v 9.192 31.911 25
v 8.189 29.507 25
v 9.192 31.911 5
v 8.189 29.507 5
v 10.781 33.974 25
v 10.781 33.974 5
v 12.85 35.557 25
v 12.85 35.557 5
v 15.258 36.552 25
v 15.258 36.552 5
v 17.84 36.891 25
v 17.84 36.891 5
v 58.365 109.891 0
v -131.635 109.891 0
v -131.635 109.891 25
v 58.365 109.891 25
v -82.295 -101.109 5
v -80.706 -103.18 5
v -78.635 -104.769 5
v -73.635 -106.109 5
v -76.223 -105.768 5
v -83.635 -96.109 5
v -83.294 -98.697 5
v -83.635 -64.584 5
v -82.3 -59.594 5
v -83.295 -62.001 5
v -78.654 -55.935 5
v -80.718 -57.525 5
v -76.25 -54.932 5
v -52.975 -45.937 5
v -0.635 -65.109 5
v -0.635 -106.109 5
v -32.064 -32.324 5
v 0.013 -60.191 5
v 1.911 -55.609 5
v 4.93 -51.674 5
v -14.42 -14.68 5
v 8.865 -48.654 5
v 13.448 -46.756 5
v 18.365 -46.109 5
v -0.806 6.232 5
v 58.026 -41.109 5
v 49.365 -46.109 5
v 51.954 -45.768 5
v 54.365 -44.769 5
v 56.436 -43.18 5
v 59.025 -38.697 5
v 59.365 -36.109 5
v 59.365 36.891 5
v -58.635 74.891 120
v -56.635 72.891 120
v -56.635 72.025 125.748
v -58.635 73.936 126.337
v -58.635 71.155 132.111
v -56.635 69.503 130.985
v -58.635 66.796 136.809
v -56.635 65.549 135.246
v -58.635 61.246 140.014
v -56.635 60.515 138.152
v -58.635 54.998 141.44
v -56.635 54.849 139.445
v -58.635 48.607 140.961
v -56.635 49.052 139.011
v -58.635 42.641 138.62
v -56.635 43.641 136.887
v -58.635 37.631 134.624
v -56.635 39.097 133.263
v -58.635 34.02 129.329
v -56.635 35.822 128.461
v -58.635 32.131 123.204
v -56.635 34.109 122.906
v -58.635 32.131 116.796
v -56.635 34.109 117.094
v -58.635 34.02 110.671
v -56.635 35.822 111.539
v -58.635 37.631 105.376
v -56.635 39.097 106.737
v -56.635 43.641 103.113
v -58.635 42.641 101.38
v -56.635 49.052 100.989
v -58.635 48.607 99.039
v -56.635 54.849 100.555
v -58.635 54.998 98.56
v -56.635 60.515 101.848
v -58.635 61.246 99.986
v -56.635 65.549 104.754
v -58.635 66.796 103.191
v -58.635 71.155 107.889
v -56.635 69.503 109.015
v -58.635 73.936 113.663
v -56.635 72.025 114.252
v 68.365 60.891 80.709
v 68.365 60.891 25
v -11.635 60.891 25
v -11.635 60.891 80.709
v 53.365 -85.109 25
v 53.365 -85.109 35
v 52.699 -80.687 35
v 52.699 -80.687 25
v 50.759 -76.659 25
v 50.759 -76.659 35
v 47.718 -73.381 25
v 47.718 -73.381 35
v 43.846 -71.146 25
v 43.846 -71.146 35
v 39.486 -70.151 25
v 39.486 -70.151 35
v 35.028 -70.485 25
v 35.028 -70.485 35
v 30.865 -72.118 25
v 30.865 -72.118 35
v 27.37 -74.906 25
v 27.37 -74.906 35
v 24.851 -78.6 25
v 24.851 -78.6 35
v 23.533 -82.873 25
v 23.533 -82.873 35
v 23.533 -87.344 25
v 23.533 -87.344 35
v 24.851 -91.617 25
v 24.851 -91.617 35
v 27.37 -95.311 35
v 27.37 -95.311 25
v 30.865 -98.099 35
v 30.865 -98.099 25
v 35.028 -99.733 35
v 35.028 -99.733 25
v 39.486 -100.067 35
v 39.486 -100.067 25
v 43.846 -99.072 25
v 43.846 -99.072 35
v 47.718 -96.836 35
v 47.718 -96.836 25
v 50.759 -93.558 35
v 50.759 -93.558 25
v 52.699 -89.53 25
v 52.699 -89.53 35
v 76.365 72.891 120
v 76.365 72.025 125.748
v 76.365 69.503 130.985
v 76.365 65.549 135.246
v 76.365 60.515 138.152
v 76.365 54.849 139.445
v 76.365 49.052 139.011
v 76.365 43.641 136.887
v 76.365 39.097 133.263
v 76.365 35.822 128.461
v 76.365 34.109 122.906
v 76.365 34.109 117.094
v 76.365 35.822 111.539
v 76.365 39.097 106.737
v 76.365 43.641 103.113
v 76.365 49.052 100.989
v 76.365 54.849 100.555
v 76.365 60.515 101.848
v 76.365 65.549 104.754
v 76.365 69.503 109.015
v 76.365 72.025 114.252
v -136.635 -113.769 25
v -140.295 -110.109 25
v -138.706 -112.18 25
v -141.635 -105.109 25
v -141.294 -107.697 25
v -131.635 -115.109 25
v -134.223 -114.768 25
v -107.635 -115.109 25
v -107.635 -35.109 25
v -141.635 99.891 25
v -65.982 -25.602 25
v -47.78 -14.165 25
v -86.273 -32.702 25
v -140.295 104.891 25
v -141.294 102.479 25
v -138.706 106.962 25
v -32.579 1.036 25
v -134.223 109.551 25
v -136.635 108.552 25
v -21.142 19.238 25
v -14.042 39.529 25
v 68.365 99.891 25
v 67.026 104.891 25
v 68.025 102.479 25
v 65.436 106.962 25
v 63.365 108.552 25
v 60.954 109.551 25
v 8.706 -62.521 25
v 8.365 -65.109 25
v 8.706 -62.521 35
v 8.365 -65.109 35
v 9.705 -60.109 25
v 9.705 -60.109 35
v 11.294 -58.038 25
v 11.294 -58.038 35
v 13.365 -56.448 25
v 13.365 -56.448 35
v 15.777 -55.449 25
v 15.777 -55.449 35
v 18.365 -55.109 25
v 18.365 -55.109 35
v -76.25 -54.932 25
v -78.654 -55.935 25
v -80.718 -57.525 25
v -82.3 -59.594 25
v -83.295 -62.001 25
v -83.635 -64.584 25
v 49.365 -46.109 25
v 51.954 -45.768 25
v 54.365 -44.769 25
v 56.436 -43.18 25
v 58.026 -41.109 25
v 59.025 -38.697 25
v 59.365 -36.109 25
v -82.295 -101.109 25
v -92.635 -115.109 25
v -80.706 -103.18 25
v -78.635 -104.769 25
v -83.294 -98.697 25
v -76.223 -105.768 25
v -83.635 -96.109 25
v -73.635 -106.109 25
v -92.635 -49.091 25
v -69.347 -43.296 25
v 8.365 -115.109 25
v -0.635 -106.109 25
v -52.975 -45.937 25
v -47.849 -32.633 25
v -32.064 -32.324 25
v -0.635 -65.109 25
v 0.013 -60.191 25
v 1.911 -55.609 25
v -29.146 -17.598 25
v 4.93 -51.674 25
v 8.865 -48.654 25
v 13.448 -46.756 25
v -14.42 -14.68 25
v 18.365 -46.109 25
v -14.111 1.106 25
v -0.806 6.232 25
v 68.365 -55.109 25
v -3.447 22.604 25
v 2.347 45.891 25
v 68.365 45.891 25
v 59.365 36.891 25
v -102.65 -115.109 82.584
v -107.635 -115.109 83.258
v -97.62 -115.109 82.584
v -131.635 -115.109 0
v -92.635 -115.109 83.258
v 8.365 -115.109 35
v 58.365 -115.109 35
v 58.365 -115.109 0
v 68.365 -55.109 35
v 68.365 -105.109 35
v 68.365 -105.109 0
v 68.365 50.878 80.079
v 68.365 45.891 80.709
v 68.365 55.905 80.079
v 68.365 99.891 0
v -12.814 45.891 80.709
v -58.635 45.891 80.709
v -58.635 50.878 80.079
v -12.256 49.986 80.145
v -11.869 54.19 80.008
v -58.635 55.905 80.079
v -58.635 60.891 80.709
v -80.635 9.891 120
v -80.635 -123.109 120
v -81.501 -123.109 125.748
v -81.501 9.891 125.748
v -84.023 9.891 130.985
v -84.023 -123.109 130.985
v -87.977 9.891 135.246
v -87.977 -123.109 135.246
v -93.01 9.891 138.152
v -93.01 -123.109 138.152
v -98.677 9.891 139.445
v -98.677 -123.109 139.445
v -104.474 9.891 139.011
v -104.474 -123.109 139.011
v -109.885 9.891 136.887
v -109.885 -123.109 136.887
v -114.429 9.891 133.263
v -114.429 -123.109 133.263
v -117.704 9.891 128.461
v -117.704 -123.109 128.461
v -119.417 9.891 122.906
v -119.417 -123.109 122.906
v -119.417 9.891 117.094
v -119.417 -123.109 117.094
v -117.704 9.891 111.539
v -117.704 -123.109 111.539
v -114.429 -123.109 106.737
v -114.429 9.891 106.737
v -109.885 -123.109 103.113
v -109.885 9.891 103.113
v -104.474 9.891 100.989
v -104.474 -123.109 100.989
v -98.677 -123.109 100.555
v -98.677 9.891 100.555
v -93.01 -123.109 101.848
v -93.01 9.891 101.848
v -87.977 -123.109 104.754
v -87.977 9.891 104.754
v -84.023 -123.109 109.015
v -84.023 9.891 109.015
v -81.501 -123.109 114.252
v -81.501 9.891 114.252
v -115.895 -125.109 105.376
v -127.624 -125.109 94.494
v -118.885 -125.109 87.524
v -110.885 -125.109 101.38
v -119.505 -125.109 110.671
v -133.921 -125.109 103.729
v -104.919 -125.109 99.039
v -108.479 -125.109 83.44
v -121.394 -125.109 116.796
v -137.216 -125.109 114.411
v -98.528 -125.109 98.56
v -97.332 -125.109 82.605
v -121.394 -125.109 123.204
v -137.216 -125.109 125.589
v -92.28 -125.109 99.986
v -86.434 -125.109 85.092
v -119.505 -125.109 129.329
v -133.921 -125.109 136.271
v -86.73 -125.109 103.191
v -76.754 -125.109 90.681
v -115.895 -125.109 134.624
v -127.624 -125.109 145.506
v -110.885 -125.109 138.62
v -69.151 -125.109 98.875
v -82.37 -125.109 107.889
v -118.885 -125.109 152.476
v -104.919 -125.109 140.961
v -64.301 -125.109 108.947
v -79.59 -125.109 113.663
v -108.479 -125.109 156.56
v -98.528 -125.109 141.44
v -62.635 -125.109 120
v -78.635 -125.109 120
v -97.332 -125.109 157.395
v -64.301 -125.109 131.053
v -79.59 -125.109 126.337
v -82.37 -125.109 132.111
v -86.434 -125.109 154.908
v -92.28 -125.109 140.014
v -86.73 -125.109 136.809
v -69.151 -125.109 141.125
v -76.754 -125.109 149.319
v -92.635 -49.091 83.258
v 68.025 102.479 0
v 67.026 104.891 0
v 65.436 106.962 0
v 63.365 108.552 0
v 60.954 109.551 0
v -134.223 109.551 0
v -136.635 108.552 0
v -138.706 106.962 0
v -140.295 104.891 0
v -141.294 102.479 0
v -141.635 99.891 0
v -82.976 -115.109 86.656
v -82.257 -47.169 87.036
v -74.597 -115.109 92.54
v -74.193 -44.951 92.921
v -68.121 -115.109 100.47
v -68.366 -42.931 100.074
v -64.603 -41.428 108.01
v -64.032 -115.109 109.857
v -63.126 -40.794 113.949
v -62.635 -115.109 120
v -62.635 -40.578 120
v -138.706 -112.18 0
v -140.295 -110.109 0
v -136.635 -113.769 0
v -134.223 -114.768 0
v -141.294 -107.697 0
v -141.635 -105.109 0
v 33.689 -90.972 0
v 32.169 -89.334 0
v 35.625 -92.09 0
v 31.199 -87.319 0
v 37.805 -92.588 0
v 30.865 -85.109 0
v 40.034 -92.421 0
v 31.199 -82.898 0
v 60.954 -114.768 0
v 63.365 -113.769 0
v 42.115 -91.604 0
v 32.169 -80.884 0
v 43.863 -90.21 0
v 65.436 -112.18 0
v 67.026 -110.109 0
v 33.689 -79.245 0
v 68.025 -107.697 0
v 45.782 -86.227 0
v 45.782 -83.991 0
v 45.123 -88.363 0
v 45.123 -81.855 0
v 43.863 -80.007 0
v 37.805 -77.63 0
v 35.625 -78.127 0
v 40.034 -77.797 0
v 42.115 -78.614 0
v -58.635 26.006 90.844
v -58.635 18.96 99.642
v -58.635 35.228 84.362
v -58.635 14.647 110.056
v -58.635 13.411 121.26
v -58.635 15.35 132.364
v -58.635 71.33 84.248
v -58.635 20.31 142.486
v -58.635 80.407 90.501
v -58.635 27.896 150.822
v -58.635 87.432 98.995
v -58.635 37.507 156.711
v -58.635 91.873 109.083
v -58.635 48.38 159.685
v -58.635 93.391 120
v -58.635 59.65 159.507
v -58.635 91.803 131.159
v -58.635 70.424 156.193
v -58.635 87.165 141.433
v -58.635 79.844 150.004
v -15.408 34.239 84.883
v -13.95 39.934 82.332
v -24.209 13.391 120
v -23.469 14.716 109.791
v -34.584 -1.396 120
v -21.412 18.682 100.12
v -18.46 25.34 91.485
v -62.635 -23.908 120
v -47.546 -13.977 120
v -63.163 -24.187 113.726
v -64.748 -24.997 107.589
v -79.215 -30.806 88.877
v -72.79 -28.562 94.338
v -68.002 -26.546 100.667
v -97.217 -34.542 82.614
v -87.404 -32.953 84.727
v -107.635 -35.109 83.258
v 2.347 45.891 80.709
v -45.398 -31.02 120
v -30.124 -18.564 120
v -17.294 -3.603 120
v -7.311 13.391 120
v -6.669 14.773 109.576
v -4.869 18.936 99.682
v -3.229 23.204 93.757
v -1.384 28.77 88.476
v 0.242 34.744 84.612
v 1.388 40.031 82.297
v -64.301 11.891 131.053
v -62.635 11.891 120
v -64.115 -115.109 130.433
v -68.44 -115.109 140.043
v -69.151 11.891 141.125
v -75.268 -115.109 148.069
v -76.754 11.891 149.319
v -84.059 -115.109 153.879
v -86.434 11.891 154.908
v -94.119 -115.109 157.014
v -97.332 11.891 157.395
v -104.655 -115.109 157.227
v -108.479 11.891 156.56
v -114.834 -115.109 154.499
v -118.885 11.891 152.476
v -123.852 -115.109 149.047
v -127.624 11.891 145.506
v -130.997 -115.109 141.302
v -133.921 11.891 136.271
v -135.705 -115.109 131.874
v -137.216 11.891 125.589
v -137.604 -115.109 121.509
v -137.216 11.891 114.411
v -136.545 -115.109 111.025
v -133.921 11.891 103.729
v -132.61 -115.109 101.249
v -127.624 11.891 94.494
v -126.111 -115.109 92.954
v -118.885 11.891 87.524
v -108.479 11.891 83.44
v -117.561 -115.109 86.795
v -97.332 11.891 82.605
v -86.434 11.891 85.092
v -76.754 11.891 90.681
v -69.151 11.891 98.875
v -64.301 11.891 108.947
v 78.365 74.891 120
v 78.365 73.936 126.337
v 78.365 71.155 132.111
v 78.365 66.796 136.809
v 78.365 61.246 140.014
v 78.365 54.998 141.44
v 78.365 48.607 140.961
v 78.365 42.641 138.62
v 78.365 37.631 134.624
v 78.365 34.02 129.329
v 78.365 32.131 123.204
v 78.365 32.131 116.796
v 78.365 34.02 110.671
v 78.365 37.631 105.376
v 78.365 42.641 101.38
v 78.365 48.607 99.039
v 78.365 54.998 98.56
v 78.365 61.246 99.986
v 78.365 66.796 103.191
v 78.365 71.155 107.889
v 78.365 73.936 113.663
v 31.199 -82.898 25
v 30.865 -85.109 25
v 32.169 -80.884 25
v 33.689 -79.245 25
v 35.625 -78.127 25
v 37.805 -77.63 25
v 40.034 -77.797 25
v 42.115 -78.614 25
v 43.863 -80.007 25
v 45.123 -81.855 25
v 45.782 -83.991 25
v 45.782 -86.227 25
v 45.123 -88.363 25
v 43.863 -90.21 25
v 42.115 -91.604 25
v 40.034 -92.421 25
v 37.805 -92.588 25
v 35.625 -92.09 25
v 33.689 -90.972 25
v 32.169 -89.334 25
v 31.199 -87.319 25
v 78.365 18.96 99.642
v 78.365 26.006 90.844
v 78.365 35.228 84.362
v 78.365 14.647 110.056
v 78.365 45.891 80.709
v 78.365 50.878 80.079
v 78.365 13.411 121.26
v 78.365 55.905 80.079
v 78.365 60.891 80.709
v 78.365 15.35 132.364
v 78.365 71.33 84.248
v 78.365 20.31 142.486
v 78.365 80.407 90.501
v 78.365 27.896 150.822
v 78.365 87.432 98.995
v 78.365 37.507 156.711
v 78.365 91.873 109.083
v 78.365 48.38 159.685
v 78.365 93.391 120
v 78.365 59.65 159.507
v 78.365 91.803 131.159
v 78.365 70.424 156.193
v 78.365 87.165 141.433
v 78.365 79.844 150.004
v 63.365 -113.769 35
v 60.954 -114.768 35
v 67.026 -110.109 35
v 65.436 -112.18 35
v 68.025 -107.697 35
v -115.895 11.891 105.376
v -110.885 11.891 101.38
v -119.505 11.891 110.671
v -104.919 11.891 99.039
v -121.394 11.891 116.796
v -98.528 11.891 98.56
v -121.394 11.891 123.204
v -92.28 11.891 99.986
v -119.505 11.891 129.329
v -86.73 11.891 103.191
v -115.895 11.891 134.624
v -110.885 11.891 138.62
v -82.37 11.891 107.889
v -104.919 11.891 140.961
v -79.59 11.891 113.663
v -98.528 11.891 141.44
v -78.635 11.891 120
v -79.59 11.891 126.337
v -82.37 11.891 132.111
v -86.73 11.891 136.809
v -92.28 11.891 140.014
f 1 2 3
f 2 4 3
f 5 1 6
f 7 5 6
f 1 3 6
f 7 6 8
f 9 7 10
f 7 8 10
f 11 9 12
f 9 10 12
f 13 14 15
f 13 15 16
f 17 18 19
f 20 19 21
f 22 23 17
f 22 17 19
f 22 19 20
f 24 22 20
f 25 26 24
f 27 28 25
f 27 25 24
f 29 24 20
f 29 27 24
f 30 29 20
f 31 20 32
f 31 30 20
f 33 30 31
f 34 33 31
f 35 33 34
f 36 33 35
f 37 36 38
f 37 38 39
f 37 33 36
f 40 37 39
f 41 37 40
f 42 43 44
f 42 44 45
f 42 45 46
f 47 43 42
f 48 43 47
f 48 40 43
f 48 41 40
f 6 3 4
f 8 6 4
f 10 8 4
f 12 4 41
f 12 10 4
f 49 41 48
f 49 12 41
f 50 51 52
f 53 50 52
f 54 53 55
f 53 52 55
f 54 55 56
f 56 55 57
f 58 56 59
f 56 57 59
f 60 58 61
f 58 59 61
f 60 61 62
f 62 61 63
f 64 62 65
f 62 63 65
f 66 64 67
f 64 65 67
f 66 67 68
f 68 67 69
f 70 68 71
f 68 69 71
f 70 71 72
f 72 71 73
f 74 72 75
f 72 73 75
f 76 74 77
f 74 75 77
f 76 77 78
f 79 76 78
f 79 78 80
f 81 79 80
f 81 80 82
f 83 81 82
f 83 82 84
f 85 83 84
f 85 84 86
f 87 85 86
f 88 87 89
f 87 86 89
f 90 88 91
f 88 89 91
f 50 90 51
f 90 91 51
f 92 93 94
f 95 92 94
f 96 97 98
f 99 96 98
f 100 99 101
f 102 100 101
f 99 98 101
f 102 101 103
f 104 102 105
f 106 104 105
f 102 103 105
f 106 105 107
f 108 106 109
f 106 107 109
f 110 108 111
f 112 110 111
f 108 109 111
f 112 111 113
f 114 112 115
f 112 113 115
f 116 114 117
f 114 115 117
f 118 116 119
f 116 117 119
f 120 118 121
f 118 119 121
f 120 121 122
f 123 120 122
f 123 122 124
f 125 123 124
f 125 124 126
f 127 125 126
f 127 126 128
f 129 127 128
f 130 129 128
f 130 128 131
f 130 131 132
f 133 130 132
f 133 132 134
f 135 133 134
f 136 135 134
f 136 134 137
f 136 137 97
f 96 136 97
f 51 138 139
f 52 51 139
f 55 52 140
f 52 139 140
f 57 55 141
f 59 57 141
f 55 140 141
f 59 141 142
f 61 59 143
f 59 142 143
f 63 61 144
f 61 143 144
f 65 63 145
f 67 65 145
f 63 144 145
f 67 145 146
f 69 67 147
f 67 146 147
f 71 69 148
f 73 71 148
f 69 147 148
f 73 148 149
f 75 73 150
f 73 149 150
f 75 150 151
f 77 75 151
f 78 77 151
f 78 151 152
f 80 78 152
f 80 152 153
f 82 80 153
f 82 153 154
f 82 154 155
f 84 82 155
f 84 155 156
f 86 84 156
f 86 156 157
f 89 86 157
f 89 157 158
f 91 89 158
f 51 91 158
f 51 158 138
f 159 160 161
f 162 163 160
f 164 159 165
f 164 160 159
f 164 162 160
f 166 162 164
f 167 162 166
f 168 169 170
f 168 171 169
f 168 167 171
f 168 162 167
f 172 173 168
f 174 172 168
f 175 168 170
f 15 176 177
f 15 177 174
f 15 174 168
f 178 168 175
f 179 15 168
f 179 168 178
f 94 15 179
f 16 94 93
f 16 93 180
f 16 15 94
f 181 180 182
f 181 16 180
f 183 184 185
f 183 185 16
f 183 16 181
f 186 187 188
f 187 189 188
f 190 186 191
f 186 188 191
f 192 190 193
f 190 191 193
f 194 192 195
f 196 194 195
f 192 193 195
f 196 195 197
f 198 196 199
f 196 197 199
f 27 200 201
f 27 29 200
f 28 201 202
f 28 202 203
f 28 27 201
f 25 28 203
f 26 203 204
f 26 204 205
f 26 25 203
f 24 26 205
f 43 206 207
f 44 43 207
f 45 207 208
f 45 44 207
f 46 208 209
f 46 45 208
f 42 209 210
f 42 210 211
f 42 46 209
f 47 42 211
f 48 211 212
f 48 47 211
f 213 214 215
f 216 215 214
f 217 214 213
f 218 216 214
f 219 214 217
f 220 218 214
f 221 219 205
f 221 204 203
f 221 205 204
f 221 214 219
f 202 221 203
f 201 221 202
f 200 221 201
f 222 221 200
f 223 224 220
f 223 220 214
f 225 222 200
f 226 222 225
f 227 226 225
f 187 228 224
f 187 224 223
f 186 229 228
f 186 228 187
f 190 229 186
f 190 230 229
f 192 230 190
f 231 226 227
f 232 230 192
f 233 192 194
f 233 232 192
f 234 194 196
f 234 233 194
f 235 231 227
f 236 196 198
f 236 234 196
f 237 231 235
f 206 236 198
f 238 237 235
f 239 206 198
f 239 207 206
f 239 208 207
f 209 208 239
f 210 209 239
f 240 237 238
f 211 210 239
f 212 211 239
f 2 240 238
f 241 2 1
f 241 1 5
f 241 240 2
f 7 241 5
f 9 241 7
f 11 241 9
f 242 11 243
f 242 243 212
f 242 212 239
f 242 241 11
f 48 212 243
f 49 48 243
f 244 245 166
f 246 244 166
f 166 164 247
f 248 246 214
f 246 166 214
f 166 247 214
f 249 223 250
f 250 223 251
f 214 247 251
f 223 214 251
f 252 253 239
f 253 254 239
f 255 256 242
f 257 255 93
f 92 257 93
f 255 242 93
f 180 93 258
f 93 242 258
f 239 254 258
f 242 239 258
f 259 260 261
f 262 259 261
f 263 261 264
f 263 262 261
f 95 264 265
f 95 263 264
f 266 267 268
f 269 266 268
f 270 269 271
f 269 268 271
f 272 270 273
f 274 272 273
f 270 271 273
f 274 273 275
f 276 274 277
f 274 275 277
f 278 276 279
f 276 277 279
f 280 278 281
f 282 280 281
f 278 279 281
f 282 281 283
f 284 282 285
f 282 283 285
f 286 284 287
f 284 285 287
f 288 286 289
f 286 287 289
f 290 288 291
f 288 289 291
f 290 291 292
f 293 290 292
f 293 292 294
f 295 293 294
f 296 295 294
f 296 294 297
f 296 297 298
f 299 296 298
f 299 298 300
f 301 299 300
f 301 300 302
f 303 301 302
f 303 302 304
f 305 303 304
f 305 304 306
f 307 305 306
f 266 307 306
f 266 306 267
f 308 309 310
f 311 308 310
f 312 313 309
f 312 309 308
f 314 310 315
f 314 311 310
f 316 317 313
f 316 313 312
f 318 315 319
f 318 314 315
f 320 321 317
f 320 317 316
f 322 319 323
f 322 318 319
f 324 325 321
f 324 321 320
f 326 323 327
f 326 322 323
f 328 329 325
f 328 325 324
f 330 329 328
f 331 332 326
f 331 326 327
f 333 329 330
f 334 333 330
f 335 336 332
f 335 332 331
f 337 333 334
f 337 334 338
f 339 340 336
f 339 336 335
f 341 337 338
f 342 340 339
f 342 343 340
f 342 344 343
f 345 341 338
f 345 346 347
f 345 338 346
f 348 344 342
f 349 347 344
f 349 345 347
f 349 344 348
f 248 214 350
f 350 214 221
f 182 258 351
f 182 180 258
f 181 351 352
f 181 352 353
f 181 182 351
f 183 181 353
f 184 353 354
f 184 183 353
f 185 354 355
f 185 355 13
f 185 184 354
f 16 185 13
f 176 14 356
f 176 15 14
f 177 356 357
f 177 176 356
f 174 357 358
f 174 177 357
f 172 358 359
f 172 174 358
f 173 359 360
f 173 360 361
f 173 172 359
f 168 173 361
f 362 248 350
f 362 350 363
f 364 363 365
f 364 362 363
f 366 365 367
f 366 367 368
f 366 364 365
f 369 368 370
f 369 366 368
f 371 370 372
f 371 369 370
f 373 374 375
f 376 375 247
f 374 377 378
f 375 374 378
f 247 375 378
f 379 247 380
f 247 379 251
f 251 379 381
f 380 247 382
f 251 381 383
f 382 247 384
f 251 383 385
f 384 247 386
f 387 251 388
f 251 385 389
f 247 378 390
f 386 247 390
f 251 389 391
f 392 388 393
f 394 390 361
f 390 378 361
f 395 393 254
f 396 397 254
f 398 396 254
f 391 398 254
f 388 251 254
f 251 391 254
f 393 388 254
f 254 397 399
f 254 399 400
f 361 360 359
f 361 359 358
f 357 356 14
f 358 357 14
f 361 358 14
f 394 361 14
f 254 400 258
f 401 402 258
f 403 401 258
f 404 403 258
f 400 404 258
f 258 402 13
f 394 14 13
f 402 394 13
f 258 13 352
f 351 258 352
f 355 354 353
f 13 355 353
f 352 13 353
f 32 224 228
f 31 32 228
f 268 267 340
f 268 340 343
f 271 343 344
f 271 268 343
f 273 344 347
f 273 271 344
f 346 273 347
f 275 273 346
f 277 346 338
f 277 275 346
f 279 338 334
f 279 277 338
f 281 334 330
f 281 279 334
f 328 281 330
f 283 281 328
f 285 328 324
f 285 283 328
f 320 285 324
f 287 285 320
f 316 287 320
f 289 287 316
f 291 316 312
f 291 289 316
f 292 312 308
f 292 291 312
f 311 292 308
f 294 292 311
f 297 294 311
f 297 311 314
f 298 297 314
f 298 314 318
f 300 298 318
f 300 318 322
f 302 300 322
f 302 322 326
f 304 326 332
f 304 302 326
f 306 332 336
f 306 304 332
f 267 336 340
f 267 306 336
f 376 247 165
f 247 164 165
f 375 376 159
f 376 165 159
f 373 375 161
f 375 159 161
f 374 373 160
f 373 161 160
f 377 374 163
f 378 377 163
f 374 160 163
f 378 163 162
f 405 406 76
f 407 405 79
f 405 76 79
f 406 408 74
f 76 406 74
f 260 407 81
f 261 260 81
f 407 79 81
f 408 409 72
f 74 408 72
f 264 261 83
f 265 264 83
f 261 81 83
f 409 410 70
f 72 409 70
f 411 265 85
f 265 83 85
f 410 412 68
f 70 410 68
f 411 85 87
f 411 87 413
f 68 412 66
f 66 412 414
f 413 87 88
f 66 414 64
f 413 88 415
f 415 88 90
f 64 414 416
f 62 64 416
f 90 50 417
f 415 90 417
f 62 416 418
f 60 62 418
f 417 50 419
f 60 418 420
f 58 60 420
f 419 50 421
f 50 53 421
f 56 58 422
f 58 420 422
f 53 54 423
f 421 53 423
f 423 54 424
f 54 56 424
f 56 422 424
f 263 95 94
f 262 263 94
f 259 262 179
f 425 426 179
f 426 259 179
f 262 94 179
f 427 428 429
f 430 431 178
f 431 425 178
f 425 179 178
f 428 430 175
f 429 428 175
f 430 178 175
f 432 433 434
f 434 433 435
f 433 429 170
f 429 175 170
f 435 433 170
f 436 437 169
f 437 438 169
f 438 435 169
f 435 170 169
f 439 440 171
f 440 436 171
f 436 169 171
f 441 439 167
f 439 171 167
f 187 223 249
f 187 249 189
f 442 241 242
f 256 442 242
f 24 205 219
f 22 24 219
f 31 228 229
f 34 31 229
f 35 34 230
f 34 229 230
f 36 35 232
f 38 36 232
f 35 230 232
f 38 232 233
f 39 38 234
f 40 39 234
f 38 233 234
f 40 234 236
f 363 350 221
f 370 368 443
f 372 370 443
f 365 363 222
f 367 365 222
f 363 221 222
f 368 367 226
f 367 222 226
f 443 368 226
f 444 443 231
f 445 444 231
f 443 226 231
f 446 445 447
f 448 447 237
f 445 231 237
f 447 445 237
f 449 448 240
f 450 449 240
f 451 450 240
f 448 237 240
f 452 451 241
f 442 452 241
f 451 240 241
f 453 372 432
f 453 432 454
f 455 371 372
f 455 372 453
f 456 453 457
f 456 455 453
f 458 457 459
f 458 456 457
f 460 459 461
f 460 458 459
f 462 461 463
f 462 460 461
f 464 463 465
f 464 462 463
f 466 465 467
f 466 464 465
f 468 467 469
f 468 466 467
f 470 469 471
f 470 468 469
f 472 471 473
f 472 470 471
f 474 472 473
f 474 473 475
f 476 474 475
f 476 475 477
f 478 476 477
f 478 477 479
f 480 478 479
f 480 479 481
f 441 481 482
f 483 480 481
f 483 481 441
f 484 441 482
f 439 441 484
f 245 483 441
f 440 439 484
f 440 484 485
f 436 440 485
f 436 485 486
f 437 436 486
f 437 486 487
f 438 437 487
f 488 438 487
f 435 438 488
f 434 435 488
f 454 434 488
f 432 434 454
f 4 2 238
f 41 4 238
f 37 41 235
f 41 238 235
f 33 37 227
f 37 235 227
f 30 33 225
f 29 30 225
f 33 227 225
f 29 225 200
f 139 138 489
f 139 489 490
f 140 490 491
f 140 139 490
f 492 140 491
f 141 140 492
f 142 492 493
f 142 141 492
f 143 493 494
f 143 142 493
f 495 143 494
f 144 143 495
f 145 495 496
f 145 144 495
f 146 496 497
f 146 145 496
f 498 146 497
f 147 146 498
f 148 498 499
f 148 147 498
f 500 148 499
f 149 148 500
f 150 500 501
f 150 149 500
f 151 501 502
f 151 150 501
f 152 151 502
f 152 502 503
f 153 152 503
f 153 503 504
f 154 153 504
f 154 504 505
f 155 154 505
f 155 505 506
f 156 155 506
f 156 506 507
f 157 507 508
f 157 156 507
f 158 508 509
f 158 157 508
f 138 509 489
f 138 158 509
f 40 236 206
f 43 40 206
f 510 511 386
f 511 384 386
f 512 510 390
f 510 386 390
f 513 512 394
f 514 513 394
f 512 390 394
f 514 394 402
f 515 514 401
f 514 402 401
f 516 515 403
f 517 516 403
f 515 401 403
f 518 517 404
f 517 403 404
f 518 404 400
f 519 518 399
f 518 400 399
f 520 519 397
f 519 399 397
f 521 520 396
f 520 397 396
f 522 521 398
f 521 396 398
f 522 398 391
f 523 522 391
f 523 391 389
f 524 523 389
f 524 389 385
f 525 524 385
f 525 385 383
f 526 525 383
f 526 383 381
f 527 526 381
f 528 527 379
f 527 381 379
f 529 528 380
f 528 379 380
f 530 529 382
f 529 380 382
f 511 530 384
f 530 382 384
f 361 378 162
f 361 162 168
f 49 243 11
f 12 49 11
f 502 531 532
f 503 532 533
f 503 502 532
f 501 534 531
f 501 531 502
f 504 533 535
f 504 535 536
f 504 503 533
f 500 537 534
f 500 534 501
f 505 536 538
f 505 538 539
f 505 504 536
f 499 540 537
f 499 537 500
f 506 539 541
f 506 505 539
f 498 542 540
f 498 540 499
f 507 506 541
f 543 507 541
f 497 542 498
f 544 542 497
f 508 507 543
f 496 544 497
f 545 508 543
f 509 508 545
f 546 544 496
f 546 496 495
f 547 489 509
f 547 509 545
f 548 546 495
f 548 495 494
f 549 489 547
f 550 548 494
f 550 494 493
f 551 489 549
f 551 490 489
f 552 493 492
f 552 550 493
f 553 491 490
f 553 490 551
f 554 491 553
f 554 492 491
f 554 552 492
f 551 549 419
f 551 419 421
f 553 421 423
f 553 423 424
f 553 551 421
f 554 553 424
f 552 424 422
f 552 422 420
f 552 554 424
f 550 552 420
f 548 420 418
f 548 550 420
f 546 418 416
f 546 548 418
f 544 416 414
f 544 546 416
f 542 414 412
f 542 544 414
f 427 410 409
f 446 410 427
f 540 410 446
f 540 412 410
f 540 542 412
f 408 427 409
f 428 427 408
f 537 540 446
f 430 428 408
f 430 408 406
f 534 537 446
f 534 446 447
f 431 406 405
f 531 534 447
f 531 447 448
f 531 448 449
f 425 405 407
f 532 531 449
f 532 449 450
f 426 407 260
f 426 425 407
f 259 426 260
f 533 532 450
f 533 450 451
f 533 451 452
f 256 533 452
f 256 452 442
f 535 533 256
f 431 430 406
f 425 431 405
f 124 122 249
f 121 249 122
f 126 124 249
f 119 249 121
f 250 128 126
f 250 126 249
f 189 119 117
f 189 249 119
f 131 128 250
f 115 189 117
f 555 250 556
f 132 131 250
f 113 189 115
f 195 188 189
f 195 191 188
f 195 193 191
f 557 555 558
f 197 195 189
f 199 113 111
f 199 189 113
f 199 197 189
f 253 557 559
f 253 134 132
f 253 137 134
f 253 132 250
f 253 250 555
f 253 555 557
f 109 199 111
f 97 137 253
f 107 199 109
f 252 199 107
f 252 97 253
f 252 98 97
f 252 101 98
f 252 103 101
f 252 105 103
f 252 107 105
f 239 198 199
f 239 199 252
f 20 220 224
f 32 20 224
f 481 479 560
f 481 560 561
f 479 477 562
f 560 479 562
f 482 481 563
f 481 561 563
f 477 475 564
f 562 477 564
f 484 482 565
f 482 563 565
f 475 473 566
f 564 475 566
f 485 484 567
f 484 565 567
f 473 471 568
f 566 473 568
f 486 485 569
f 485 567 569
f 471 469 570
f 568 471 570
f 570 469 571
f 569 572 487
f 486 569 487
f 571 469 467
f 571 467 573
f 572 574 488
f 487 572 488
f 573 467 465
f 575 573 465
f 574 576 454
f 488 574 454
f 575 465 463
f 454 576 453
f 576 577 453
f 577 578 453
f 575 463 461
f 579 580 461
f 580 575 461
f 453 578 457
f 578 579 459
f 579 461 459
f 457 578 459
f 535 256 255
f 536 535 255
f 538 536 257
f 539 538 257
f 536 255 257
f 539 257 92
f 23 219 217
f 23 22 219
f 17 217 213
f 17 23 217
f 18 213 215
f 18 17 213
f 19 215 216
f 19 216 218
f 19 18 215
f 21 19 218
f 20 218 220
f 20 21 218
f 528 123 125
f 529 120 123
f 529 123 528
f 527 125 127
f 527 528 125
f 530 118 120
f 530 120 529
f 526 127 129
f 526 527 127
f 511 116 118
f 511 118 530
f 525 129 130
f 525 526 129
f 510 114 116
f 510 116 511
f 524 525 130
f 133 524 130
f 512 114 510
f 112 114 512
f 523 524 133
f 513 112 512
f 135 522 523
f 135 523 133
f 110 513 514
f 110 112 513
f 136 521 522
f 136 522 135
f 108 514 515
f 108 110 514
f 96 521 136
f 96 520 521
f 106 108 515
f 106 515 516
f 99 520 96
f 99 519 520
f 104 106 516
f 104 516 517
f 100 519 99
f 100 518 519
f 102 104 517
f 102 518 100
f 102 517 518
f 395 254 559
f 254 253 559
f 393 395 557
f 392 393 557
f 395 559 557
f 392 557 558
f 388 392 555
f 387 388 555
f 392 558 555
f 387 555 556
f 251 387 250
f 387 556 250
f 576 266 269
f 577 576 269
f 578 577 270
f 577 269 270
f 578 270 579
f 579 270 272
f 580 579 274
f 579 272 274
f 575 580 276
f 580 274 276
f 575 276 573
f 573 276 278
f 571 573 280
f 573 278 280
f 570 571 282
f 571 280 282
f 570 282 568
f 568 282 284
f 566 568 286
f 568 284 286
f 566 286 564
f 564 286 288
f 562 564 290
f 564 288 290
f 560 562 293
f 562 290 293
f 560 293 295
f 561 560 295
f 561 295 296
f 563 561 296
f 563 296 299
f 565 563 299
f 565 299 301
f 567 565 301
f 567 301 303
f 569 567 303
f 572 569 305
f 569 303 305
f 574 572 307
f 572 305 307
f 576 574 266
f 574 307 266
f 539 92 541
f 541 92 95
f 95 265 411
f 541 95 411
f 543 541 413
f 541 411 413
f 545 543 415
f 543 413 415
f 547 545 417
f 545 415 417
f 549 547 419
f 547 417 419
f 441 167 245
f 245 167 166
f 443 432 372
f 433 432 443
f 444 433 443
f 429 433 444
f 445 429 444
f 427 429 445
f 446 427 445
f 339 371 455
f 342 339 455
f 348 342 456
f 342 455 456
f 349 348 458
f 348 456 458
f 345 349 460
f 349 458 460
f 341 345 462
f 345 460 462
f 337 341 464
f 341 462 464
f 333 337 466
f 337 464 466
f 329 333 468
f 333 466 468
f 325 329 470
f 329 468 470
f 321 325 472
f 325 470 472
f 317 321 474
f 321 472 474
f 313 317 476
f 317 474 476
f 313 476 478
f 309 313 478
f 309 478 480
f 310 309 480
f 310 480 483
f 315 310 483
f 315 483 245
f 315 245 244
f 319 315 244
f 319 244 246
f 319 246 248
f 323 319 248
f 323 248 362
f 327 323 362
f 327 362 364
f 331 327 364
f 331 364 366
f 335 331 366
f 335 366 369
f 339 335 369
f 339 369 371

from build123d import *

# Parameters (mm, degrees)
F0_W            = 210
F0_H            = 225
F1_DEPTH        = 25
F3_DEPTH        = 95
F4_R            = 37.5
F5_DEPTH        = 10
F5_DEPTH_BACK   = 127
F7_DEPTH        = 10
F7_DEPTH_BACK   = 127
F8_W            = 60
F8_H            = 60
F9_DEPTH        = 10
F10_R           = 10
F12_DEPTH       = 20
F14_D           = 15
F14_CBORE_D     = 30
F14_CBORE_DEPTH = 10
F15_R           = 10
F17_R           = 19.5
F18_DEPTH       = 220.001
F16_R           = 19.5
F19_DEPTH       = 235.001
F20_SIZE        = 2
F21_R           = 10


with BuildPart() as f1:
    # F0 (on Top) → F1 (new body)
    with BuildSketch(Plane.XY):
        with Locations((-36.6346123987, -2.6086959988)):
            Rectangle(F0_W, F0_H)
    extrude(amount=F1_DEPTH)

    # F2 (on face) → F3 (join)
    with BuildSketch(Plane.XY.offset(25)):
        with BuildLine():
            Line((68.3653876013, 45.8913040012), (68.3653876013, 60.8913040012))
            Line((68.3653876013, 60.8913040012), (-11.6346123987, 60.8913040012))
            ThreePointArc((-11.6346123987, 60.8913040012), (-39.7523614048, -6.9909469927), (-107.6346123987, -35.1086959988))
            Line((-107.6346123987, -35.1086959988), (-107.6346123987, -115.1086959988))
            Line((-107.6346123987, -115.1086959988), (-92.6346123987, -115.1086959988))
            Line((-92.6346123987, -115.1086959988), (-92.6346123987, -49.0905126777))
            ThreePointArc((-92.6346123987, -49.0905126777), (-29.145759687, -17.5975487105), (2.3472042802, 45.8913040012))
            Line((2.3472042802, 45.8913040012), (68.3653876013, 45.8913040012))
        make_face()
    extrude(amount=F3_DEPTH)

    # F4 (on face) → F5 (join, two sides)
    with BuildSketch(Plane.XZ.offset(115.1086959988)) as f5_sk:
        with Locations((-100.1346123987, 120)):
            Circle(F4_R)
    extrude(amount=F5_DEPTH)
    extrude(f5_sk.sketch, amount=-F5_DEPTH_BACK)

    # F6 (on face) → F7 (join, two sides)
    with BuildSketch(Plane.YZ.offset(68.3653876013)) as f7_sk:
        with BuildLine():
            ThreePointArc((60.8913040012, 80.7094158862), (84.2133740161, 94.504902432), (93.3913040012, 120))
            ThreePointArc((93.3913040012, 120), (27.8962064332, 150.8220700148), (45.8913040012, 80.7094158862))
            Line((45.8913040012, 80.7094158862), (45.8913040012, 120))
            Line((45.8913040012, 120), (60.8913040012, 120))
            Line((60.8913040012, 120), (60.8913040012, 80.7094158862))
        make_face()
        with BuildLine():
            Line((45.8913040012, 120), (45.8913040012, 80.7094158862))
            ThreePointArc((45.8913040012, 80.7094158862), (53.3913040012, 80), (60.8913040012, 80.7094158862))
            Line((60.8913040012, 80.7094158862), (60.8913040012, 120))
            Line((60.8913040012, 120), (45.8913040012, 120))
        make_face()
    extrude(amount=F7_DEPTH)
    extrude(f7_sk.sketch, amount=-F7_DEPTH_BACK)

    # F8 (on face) → F9 (join)
    with BuildSketch(Plane.XY.offset(25)):
        with Locations((38.3653876013, -85.1086959988)):
            Rectangle(F8_W, F8_H)
    extrude(amount=F9_DEPTH)

    # F10
    f10_edges = [f1.edges().sort_by_distance(p)[0] for p in [
        (8.365388, -55.108696, 30),
    ]]
    fillet(f10_edges, radius=F10_R)

    # F11 (on face) → F12 (cut)
    with BuildSketch(Plane.XY.offset(25)):
        with BuildLine():
            ThreePointArc((9.9408952549, 36.8913040012), (-22.7817986563, -23.9615097412), (-83.6346123987, -56.6842036524))
            Line((-83.6346123987, -56.6842036524), (-83.6346123987, -106.1086959988))
            Line((-83.6346123987, -106.1086959988), (-0.6346123987, -106.1086959988))
            Line((-0.6346123987, -106.1086959988), (-0.6346123987, -65.1086959988))
            ThreePointArc((-0.6346123987, -65.1086959988), (4.9303587587, -51.6736671562), (18.3653876013, -46.1086959988))
            Line((18.3653876013, -46.1086959988), (59.3653876013, -46.1086959988))
            Line((59.3653876013, -46.1086959988), (59.3653876013, 36.8913040012))
            Line((59.3653876013, 36.8913040012), (9.9408952549, 36.8913040012))
        make_face()
    extrude(amount=-F12_DEPTH, mode=Mode.SUBTRACT)

    # F14 (through all)
    with Locations(Plane.XY.offset(35)):
        with Locations((38.3653876013, -85.1086959988)):
            CounterBoreHole(F14_D / 2, F14_CBORE_D / 2, F14_CBORE_DEPTH)

    # F15
    f15_edges = [f1.edges().sort_by_distance(p)[0] for p in [
        (-83.634612, -56.684204, 15),
        (9.940895, 36.891304, 15),
        (-83.634612, -106.108696, 15),
        (59.365388, -46.108696, 15),
    ]]
    fillet(f15_edges, radius=F15_R)

    # F17 (on face) → F18 (cut, through all)
    with BuildSketch(Plane.YZ.offset(78.3653876013)):
        with Locations((53.3913040012, 120)):
            Circle(F17_R)
    extrude(amount=-F18_DEPTH, mode=Mode.SUBTRACT)

    # F16 (on face) → F19 (cut, through all)
    with BuildSketch(Plane.XZ.offset(125.1086959988)):
        with Locations((-100.1346123987, 120)):
            Circle(F16_R)
    extrude(amount=-F19_DEPTH, mode=Mode.SUBTRACT)

    # F20
    f20_edges = [f1.edges().sort_by_distance(p)[0] for p in [
        (-119.634612, -125.108696, 120),
        (78.365388, 33.891304, 120),
        (-119.634612, 11.891304, 120),
        (-58.634612, 33.891304, 120),
    ]]
    chamfer(f20_edges, length=F20_SIZE)

    # F21
    f21_edges = [f1.edges().sort_by_distance(p)[0] for p in [
        (68.365388, -115.108696, 17.5),
        (-141.634612, -115.108696, 12.5),
        (68.365388, 109.891304, 12.5),
        (-141.634612, 109.891304, 12.5),
    ]]
    fillet(f21_edges, radius=F21_R)


solid = f1.part
